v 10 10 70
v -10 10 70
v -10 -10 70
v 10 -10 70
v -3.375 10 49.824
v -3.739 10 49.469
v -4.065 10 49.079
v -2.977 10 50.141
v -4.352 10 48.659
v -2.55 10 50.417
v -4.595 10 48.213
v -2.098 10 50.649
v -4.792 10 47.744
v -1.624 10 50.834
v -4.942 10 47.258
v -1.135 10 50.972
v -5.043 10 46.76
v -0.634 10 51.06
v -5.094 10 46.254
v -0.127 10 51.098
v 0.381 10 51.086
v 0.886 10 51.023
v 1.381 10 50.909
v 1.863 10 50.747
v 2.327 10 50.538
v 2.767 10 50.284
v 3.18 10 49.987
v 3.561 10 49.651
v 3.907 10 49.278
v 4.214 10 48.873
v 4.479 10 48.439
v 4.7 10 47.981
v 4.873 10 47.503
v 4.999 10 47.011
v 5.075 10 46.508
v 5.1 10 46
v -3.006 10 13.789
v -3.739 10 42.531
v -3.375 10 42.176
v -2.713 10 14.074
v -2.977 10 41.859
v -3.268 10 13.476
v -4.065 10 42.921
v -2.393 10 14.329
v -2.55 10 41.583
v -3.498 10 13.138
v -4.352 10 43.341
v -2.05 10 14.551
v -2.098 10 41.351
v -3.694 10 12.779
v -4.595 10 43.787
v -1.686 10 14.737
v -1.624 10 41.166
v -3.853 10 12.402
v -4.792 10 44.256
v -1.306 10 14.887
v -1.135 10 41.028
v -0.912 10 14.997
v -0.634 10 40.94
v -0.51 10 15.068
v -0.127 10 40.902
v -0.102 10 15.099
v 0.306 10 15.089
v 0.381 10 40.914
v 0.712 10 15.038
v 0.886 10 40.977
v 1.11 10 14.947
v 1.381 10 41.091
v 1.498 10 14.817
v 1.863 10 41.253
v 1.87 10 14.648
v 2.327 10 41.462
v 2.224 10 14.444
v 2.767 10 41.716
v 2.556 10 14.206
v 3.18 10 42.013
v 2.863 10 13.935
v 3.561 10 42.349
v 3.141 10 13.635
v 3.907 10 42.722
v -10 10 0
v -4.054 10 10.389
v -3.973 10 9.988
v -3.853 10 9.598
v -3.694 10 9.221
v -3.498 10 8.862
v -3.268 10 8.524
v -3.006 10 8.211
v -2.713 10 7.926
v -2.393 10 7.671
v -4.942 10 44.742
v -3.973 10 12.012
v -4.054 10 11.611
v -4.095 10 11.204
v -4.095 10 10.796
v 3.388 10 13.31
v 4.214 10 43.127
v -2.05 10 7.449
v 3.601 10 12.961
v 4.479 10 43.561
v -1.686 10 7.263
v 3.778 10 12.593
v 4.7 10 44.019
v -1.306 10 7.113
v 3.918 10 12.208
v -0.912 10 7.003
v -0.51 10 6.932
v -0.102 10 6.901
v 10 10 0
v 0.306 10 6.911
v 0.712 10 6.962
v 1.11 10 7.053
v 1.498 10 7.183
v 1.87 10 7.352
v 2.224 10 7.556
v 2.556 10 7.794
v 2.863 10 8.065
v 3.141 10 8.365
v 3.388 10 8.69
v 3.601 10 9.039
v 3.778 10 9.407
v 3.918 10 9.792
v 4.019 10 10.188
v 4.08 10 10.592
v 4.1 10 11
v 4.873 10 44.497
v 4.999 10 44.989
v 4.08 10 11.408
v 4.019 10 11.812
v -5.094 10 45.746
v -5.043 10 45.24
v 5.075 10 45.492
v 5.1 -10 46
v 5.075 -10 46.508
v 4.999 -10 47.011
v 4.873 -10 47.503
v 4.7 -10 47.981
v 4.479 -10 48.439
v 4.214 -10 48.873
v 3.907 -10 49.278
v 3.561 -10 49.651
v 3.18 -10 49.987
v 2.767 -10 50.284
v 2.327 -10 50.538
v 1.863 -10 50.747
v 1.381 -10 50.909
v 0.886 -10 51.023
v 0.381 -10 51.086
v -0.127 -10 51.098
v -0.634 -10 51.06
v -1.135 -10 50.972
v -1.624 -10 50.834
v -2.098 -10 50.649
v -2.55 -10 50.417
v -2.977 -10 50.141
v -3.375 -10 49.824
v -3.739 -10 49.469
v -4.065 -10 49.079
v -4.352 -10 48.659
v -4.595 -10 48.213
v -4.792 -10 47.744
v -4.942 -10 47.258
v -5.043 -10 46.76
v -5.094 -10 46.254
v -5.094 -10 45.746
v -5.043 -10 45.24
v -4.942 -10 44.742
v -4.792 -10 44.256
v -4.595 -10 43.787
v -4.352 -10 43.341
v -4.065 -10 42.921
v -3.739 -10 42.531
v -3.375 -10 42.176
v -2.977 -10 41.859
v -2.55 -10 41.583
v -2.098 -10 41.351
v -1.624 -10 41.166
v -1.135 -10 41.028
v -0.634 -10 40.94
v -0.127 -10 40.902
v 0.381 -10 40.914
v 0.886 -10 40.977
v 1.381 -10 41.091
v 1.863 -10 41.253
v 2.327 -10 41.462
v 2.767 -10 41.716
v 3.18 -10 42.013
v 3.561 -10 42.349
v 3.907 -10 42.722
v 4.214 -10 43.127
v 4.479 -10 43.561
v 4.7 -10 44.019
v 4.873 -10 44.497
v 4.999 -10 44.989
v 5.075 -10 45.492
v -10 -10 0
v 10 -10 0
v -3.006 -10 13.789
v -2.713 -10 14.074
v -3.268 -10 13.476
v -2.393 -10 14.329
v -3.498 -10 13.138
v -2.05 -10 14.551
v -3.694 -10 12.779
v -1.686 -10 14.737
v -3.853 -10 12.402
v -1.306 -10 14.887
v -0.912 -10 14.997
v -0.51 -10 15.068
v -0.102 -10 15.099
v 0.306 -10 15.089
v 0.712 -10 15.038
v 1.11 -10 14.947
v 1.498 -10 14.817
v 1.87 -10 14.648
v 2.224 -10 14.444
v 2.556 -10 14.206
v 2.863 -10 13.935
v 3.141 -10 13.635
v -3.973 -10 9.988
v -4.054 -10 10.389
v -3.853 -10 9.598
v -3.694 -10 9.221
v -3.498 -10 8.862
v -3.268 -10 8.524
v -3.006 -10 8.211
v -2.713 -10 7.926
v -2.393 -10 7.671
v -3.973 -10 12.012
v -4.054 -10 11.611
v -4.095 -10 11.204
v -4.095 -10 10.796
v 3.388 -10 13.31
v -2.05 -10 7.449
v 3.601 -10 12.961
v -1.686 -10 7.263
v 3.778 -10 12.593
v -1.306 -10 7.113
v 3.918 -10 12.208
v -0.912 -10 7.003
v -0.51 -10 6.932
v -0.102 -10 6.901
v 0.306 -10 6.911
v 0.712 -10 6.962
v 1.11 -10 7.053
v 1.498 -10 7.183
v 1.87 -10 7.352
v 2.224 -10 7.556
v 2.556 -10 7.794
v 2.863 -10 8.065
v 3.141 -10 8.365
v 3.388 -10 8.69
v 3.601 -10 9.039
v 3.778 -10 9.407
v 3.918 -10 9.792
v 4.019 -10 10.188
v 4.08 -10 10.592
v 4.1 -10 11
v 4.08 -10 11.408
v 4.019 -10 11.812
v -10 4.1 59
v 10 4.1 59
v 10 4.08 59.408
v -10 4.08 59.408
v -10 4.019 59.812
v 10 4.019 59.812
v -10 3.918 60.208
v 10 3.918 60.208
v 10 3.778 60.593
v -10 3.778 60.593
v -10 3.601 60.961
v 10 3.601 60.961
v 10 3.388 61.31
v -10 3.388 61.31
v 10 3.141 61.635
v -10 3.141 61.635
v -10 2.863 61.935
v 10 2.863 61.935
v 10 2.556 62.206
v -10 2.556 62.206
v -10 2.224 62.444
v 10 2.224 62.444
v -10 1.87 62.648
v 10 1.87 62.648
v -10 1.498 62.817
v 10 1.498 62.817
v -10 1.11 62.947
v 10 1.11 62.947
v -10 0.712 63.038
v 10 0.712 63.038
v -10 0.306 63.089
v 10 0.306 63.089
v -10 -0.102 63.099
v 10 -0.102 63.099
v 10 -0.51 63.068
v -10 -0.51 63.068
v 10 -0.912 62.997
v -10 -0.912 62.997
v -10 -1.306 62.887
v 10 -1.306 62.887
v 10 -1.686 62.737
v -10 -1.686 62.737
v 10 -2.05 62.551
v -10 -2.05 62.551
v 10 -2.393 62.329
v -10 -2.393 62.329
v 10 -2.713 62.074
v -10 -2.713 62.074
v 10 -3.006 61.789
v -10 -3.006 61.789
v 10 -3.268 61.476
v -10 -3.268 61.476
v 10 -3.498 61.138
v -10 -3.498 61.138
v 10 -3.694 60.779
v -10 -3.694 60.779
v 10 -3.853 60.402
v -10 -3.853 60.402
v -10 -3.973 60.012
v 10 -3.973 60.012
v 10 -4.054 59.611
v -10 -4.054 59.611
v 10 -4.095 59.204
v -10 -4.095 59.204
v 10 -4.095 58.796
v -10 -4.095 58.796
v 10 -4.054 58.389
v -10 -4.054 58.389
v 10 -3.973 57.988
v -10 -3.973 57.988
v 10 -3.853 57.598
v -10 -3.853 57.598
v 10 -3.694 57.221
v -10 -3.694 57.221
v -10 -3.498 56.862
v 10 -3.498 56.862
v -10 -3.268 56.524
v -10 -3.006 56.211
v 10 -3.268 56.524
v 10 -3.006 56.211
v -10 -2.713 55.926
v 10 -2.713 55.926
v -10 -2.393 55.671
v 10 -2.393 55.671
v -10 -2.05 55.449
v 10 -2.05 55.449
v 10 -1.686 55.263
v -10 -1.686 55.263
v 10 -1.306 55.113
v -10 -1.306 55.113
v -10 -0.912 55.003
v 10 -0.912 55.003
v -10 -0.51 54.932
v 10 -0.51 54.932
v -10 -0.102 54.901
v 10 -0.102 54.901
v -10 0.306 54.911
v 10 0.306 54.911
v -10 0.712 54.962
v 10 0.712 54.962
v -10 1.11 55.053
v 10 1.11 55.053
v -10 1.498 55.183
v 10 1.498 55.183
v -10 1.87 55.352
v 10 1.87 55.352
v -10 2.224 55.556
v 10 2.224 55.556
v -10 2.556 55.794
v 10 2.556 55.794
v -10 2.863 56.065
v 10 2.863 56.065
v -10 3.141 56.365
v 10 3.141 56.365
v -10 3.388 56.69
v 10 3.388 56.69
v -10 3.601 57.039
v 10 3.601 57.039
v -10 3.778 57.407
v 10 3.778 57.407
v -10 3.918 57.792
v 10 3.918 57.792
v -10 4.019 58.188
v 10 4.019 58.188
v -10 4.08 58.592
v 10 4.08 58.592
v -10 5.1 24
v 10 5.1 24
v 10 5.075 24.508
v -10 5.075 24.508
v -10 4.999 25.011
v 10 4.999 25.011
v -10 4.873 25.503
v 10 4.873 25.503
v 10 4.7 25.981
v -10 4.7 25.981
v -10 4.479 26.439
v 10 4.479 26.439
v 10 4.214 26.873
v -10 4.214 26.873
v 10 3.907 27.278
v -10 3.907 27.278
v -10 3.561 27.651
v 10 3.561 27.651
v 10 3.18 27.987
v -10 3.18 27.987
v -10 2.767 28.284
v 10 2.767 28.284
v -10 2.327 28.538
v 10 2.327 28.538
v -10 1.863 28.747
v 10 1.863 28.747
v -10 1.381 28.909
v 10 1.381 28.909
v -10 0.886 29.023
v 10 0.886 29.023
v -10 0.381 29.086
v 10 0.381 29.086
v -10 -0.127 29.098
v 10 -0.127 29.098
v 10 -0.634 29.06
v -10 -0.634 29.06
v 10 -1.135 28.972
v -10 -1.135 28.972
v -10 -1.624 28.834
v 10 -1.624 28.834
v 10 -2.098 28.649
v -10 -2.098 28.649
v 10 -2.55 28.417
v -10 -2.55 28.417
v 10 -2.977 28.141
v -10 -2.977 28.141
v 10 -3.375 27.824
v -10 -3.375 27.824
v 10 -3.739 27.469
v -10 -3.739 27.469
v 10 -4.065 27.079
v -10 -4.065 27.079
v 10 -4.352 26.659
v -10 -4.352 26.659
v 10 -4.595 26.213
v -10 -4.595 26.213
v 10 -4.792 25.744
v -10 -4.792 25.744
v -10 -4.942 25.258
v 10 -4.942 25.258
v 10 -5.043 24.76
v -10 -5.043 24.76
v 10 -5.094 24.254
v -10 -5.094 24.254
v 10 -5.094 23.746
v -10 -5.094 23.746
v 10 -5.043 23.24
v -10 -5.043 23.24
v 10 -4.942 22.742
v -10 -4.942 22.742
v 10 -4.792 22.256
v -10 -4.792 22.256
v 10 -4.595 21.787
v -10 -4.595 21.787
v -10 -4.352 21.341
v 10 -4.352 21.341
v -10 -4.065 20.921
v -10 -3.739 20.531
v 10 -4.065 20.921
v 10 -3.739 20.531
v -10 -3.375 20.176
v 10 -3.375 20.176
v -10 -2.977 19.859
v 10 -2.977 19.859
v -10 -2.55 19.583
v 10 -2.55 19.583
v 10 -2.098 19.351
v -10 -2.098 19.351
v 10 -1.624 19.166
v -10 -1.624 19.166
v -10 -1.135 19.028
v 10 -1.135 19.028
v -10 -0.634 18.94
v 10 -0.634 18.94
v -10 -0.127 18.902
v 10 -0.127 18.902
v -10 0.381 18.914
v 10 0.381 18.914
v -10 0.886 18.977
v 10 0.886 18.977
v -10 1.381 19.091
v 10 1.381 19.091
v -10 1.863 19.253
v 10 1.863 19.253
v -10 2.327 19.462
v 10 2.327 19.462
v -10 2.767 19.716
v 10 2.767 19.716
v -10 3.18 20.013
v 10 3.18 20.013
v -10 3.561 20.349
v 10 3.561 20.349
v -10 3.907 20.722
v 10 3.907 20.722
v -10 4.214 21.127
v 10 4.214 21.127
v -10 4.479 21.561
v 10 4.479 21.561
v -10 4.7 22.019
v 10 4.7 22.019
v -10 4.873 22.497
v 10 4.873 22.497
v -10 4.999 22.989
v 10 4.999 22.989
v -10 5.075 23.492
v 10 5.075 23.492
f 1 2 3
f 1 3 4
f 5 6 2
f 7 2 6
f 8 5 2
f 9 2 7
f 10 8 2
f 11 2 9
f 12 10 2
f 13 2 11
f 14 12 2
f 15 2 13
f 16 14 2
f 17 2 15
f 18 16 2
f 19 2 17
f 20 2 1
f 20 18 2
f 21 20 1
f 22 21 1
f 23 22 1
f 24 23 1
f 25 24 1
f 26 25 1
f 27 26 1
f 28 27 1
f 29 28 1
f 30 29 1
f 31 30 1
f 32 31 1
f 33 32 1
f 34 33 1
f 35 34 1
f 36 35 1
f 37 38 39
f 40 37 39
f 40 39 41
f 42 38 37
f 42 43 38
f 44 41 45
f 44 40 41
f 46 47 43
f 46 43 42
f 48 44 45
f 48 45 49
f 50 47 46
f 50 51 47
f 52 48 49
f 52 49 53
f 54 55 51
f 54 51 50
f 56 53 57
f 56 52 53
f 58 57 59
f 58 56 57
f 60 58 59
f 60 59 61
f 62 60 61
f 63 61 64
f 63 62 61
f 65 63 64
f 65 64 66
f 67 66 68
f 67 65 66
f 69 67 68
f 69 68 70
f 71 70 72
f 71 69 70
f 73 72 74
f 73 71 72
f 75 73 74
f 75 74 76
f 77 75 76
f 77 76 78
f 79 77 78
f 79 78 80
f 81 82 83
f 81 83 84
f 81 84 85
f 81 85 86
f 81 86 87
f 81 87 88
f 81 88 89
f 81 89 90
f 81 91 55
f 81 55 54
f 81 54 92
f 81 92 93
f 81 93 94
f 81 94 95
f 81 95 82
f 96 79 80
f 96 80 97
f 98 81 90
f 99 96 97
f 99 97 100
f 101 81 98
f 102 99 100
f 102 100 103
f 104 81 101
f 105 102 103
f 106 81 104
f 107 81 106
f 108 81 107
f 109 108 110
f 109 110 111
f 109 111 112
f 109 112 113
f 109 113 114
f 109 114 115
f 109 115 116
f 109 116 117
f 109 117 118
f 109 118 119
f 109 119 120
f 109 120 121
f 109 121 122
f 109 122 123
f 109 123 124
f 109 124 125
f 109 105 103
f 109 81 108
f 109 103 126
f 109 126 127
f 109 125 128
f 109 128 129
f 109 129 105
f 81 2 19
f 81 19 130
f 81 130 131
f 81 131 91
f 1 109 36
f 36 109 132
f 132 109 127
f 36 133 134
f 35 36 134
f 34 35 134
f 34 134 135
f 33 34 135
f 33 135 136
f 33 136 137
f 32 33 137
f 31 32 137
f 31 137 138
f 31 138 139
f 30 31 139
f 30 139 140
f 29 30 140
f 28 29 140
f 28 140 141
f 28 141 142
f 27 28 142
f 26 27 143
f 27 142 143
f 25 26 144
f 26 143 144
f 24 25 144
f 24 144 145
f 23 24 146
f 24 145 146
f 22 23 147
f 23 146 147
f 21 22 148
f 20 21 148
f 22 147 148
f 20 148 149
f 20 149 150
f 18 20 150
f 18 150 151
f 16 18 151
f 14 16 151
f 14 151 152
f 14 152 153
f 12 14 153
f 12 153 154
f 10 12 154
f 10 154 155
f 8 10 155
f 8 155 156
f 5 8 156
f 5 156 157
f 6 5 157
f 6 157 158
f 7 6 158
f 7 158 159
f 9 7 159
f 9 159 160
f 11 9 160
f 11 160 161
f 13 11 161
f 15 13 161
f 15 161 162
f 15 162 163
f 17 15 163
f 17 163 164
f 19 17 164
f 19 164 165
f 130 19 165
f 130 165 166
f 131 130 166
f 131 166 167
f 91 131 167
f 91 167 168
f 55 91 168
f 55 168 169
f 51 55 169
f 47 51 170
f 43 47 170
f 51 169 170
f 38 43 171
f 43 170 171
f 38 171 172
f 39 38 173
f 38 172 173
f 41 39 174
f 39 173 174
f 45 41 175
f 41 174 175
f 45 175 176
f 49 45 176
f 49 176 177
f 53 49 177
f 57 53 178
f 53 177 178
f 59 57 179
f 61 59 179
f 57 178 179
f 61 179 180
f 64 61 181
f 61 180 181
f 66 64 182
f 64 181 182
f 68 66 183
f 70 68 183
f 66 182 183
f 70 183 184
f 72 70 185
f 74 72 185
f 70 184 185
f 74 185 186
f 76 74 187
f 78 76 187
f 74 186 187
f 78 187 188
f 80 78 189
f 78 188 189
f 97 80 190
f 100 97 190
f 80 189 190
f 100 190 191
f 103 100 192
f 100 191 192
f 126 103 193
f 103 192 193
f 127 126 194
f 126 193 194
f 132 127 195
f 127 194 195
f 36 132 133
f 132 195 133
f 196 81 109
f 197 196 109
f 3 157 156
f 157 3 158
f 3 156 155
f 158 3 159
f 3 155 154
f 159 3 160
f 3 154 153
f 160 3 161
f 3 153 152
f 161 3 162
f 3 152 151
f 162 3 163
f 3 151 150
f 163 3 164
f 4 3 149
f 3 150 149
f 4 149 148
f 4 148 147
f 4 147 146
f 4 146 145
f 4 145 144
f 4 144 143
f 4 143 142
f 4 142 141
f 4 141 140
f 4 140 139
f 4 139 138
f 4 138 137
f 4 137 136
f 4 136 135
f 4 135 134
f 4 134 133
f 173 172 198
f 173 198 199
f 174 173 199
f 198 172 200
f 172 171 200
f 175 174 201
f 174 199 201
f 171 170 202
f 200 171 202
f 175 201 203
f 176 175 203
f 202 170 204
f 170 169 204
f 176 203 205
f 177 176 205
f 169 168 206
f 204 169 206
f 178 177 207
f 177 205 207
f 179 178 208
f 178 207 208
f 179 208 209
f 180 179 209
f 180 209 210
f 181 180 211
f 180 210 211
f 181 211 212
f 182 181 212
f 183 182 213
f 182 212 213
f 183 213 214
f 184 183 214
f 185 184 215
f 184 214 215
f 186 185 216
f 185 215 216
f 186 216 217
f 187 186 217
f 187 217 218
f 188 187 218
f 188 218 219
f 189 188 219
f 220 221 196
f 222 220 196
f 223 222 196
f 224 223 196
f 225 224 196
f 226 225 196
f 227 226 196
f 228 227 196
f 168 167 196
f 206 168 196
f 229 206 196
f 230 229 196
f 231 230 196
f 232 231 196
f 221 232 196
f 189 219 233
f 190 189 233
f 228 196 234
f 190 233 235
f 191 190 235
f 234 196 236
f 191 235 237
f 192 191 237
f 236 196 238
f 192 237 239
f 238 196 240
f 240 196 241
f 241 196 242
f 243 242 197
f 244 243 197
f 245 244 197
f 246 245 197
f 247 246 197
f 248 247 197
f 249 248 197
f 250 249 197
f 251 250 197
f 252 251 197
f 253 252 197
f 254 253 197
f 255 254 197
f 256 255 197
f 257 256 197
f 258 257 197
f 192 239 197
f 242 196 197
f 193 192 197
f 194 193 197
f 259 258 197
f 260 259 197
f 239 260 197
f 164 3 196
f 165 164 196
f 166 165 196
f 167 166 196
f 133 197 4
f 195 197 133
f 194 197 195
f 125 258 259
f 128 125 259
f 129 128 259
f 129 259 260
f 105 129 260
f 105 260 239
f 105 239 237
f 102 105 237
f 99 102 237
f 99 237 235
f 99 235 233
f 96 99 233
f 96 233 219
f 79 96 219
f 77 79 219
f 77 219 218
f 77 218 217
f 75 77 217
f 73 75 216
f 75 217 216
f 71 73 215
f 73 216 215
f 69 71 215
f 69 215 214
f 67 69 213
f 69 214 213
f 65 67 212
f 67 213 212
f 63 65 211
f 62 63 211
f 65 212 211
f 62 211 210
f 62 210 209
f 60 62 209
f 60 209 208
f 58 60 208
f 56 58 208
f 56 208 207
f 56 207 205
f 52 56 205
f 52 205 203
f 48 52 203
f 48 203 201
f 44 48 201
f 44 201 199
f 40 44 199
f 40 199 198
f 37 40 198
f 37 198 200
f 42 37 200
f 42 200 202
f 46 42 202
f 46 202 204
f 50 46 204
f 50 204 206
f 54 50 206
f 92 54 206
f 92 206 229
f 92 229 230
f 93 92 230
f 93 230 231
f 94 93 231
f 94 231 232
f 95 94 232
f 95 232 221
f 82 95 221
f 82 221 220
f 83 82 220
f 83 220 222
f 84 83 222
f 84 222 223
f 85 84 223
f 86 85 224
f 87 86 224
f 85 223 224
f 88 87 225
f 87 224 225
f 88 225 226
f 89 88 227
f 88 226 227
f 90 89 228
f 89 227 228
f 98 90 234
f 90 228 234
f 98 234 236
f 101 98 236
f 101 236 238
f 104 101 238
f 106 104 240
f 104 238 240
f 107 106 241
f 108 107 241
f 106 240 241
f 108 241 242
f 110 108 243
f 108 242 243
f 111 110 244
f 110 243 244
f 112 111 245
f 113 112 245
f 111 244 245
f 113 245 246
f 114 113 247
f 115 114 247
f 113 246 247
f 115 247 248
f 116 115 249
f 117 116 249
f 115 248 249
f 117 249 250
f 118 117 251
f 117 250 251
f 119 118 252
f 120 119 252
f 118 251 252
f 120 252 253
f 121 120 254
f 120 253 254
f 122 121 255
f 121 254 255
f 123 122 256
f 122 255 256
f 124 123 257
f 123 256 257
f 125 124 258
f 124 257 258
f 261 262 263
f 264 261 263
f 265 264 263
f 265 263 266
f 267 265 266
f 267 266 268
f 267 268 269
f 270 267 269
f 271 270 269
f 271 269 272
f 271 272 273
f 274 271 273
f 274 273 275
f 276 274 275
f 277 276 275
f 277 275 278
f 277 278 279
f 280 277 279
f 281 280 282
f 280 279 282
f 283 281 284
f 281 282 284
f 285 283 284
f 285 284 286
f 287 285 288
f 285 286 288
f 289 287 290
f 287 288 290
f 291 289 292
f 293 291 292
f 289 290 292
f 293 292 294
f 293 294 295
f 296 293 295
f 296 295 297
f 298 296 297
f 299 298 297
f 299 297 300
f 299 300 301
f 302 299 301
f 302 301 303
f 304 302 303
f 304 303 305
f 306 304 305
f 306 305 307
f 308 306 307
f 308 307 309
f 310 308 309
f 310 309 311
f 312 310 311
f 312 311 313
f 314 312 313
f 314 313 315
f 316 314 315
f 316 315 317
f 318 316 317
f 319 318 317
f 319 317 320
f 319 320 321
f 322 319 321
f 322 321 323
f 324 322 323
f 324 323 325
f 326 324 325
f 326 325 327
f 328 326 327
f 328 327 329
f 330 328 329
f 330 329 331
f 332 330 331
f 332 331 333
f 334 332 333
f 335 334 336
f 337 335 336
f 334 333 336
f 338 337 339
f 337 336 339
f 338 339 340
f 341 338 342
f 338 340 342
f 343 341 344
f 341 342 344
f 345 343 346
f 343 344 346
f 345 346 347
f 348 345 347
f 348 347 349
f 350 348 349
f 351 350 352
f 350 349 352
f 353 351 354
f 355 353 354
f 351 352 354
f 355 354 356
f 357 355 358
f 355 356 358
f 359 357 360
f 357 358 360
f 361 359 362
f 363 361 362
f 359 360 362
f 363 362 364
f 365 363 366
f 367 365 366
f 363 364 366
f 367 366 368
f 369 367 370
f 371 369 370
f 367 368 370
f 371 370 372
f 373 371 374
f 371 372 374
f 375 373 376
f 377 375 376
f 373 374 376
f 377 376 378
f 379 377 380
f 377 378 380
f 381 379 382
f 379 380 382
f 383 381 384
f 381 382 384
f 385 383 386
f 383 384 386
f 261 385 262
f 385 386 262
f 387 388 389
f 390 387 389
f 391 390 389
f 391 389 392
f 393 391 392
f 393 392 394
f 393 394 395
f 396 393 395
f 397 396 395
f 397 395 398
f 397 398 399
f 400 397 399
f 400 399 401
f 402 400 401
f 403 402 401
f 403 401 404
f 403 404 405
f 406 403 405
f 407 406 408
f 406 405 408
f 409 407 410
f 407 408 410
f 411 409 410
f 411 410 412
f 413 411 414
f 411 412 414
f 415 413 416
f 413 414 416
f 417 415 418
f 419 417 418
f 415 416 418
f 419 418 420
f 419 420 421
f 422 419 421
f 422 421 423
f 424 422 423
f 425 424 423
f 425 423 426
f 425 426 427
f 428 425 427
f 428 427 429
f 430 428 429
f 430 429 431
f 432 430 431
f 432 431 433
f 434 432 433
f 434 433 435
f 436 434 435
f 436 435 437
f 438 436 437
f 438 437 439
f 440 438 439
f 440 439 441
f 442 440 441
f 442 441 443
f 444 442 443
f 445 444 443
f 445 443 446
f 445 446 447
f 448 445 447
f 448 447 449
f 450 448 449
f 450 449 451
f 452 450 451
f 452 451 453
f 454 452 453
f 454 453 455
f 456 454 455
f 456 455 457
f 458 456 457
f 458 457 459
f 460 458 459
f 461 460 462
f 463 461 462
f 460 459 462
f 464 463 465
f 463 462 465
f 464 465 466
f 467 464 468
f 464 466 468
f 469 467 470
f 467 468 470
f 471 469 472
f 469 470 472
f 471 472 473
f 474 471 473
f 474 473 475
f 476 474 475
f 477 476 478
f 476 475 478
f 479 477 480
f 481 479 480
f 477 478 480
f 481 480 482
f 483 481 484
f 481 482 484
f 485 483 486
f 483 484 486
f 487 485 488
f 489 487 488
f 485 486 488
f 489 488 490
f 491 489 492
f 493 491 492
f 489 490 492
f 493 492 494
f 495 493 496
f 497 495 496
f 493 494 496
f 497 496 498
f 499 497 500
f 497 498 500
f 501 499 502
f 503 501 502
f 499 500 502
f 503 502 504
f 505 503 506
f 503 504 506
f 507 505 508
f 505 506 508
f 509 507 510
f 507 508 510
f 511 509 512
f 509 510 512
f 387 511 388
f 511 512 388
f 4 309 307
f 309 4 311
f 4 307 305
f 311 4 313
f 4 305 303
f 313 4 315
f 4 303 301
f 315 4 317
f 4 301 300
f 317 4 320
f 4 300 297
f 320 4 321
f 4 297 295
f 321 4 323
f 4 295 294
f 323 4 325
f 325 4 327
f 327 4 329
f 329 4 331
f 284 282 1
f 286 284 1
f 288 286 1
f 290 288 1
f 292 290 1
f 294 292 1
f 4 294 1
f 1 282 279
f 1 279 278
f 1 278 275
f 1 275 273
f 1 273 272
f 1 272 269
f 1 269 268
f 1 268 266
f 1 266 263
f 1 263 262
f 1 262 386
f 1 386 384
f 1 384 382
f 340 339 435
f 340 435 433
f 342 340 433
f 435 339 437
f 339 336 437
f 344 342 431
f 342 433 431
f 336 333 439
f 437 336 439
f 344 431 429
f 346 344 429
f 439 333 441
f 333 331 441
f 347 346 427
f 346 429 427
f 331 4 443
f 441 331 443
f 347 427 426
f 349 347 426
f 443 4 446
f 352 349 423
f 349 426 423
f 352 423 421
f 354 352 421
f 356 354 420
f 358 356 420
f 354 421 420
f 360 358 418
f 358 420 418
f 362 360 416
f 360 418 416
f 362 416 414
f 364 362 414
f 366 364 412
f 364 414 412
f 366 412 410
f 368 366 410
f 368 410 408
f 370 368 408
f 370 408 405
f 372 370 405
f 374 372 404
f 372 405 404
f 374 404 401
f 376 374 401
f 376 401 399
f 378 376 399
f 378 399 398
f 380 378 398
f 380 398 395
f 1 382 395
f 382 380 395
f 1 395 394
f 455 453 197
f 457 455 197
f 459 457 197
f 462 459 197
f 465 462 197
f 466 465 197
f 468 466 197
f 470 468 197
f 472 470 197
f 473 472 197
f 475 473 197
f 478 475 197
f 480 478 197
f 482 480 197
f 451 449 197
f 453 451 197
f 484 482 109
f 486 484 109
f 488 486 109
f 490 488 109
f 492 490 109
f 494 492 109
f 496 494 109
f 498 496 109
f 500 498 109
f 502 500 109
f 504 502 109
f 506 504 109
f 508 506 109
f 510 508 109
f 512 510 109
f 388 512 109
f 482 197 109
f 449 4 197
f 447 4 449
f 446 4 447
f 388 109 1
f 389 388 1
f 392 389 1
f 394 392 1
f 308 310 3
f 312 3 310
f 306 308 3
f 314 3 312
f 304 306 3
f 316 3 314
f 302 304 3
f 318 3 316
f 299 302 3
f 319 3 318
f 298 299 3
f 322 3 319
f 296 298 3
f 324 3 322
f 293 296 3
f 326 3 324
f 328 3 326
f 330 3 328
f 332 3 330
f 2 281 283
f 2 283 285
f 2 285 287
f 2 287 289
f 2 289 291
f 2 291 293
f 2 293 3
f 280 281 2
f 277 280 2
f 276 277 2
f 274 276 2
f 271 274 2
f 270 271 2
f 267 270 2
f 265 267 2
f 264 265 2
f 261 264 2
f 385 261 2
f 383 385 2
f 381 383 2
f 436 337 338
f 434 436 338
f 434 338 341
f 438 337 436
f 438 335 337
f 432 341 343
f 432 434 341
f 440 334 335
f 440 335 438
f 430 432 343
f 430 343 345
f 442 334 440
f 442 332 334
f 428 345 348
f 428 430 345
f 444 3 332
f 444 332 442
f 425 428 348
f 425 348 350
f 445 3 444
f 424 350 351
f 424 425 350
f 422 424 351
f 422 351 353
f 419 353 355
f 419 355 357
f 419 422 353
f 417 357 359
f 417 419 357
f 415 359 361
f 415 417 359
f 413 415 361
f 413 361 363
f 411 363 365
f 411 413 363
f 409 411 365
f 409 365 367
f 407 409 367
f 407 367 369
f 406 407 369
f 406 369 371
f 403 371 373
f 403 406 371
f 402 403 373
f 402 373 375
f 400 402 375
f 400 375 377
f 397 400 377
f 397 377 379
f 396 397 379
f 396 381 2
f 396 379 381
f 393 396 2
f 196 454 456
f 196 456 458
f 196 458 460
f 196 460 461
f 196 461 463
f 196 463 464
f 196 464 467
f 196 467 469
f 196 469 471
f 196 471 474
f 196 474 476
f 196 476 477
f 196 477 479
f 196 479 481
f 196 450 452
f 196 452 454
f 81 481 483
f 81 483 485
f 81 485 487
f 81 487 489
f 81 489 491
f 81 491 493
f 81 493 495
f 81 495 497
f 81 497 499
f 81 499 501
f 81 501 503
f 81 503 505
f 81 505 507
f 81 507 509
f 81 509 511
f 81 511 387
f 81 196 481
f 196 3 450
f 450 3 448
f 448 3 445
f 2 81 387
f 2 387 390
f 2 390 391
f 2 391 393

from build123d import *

# Parameters (mm, degrees)
F0_W     = 20
F0_H     = 20
F1_DEPTH = 70
F2_R     = 5.1
F2_R_2   = 4.1
F3_DEPTH = 20.001
F4_R     = 5.1
F4_R_2   = 4.1
F5_DEPTH = 20.001


with BuildPart() as f1:
    # F0 (on Top) → F1 (new body)
    with BuildSketch(Plane.XY):
        Rectangle(F0_W, F0_H)
    extrude(amount=F1_DEPTH)

    # F2 (on face) → F3 (cut, through all)
    with BuildSketch(Plane.XZ.offset(10)):
        with Locations((0, 46)):
            Circle(F2_R)
        with Locations((0, 11)):
            Circle(F2_R_2)
    extrude(amount=-F3_DEPTH, mode=Mode.SUBTRACT)

    # F4 (on face) → F5 (cut, through all)
    with BuildSketch(Plane.YZ.offset(10)):
        with Locations((0, 24)):
            Circle(F4_R)
        with Locations((0, 59)):
            Circle(F4_R_2)
    extrude(amount=-F5_DEPTH, mode=Mode.SUBTRACT)


solid = f1.part
